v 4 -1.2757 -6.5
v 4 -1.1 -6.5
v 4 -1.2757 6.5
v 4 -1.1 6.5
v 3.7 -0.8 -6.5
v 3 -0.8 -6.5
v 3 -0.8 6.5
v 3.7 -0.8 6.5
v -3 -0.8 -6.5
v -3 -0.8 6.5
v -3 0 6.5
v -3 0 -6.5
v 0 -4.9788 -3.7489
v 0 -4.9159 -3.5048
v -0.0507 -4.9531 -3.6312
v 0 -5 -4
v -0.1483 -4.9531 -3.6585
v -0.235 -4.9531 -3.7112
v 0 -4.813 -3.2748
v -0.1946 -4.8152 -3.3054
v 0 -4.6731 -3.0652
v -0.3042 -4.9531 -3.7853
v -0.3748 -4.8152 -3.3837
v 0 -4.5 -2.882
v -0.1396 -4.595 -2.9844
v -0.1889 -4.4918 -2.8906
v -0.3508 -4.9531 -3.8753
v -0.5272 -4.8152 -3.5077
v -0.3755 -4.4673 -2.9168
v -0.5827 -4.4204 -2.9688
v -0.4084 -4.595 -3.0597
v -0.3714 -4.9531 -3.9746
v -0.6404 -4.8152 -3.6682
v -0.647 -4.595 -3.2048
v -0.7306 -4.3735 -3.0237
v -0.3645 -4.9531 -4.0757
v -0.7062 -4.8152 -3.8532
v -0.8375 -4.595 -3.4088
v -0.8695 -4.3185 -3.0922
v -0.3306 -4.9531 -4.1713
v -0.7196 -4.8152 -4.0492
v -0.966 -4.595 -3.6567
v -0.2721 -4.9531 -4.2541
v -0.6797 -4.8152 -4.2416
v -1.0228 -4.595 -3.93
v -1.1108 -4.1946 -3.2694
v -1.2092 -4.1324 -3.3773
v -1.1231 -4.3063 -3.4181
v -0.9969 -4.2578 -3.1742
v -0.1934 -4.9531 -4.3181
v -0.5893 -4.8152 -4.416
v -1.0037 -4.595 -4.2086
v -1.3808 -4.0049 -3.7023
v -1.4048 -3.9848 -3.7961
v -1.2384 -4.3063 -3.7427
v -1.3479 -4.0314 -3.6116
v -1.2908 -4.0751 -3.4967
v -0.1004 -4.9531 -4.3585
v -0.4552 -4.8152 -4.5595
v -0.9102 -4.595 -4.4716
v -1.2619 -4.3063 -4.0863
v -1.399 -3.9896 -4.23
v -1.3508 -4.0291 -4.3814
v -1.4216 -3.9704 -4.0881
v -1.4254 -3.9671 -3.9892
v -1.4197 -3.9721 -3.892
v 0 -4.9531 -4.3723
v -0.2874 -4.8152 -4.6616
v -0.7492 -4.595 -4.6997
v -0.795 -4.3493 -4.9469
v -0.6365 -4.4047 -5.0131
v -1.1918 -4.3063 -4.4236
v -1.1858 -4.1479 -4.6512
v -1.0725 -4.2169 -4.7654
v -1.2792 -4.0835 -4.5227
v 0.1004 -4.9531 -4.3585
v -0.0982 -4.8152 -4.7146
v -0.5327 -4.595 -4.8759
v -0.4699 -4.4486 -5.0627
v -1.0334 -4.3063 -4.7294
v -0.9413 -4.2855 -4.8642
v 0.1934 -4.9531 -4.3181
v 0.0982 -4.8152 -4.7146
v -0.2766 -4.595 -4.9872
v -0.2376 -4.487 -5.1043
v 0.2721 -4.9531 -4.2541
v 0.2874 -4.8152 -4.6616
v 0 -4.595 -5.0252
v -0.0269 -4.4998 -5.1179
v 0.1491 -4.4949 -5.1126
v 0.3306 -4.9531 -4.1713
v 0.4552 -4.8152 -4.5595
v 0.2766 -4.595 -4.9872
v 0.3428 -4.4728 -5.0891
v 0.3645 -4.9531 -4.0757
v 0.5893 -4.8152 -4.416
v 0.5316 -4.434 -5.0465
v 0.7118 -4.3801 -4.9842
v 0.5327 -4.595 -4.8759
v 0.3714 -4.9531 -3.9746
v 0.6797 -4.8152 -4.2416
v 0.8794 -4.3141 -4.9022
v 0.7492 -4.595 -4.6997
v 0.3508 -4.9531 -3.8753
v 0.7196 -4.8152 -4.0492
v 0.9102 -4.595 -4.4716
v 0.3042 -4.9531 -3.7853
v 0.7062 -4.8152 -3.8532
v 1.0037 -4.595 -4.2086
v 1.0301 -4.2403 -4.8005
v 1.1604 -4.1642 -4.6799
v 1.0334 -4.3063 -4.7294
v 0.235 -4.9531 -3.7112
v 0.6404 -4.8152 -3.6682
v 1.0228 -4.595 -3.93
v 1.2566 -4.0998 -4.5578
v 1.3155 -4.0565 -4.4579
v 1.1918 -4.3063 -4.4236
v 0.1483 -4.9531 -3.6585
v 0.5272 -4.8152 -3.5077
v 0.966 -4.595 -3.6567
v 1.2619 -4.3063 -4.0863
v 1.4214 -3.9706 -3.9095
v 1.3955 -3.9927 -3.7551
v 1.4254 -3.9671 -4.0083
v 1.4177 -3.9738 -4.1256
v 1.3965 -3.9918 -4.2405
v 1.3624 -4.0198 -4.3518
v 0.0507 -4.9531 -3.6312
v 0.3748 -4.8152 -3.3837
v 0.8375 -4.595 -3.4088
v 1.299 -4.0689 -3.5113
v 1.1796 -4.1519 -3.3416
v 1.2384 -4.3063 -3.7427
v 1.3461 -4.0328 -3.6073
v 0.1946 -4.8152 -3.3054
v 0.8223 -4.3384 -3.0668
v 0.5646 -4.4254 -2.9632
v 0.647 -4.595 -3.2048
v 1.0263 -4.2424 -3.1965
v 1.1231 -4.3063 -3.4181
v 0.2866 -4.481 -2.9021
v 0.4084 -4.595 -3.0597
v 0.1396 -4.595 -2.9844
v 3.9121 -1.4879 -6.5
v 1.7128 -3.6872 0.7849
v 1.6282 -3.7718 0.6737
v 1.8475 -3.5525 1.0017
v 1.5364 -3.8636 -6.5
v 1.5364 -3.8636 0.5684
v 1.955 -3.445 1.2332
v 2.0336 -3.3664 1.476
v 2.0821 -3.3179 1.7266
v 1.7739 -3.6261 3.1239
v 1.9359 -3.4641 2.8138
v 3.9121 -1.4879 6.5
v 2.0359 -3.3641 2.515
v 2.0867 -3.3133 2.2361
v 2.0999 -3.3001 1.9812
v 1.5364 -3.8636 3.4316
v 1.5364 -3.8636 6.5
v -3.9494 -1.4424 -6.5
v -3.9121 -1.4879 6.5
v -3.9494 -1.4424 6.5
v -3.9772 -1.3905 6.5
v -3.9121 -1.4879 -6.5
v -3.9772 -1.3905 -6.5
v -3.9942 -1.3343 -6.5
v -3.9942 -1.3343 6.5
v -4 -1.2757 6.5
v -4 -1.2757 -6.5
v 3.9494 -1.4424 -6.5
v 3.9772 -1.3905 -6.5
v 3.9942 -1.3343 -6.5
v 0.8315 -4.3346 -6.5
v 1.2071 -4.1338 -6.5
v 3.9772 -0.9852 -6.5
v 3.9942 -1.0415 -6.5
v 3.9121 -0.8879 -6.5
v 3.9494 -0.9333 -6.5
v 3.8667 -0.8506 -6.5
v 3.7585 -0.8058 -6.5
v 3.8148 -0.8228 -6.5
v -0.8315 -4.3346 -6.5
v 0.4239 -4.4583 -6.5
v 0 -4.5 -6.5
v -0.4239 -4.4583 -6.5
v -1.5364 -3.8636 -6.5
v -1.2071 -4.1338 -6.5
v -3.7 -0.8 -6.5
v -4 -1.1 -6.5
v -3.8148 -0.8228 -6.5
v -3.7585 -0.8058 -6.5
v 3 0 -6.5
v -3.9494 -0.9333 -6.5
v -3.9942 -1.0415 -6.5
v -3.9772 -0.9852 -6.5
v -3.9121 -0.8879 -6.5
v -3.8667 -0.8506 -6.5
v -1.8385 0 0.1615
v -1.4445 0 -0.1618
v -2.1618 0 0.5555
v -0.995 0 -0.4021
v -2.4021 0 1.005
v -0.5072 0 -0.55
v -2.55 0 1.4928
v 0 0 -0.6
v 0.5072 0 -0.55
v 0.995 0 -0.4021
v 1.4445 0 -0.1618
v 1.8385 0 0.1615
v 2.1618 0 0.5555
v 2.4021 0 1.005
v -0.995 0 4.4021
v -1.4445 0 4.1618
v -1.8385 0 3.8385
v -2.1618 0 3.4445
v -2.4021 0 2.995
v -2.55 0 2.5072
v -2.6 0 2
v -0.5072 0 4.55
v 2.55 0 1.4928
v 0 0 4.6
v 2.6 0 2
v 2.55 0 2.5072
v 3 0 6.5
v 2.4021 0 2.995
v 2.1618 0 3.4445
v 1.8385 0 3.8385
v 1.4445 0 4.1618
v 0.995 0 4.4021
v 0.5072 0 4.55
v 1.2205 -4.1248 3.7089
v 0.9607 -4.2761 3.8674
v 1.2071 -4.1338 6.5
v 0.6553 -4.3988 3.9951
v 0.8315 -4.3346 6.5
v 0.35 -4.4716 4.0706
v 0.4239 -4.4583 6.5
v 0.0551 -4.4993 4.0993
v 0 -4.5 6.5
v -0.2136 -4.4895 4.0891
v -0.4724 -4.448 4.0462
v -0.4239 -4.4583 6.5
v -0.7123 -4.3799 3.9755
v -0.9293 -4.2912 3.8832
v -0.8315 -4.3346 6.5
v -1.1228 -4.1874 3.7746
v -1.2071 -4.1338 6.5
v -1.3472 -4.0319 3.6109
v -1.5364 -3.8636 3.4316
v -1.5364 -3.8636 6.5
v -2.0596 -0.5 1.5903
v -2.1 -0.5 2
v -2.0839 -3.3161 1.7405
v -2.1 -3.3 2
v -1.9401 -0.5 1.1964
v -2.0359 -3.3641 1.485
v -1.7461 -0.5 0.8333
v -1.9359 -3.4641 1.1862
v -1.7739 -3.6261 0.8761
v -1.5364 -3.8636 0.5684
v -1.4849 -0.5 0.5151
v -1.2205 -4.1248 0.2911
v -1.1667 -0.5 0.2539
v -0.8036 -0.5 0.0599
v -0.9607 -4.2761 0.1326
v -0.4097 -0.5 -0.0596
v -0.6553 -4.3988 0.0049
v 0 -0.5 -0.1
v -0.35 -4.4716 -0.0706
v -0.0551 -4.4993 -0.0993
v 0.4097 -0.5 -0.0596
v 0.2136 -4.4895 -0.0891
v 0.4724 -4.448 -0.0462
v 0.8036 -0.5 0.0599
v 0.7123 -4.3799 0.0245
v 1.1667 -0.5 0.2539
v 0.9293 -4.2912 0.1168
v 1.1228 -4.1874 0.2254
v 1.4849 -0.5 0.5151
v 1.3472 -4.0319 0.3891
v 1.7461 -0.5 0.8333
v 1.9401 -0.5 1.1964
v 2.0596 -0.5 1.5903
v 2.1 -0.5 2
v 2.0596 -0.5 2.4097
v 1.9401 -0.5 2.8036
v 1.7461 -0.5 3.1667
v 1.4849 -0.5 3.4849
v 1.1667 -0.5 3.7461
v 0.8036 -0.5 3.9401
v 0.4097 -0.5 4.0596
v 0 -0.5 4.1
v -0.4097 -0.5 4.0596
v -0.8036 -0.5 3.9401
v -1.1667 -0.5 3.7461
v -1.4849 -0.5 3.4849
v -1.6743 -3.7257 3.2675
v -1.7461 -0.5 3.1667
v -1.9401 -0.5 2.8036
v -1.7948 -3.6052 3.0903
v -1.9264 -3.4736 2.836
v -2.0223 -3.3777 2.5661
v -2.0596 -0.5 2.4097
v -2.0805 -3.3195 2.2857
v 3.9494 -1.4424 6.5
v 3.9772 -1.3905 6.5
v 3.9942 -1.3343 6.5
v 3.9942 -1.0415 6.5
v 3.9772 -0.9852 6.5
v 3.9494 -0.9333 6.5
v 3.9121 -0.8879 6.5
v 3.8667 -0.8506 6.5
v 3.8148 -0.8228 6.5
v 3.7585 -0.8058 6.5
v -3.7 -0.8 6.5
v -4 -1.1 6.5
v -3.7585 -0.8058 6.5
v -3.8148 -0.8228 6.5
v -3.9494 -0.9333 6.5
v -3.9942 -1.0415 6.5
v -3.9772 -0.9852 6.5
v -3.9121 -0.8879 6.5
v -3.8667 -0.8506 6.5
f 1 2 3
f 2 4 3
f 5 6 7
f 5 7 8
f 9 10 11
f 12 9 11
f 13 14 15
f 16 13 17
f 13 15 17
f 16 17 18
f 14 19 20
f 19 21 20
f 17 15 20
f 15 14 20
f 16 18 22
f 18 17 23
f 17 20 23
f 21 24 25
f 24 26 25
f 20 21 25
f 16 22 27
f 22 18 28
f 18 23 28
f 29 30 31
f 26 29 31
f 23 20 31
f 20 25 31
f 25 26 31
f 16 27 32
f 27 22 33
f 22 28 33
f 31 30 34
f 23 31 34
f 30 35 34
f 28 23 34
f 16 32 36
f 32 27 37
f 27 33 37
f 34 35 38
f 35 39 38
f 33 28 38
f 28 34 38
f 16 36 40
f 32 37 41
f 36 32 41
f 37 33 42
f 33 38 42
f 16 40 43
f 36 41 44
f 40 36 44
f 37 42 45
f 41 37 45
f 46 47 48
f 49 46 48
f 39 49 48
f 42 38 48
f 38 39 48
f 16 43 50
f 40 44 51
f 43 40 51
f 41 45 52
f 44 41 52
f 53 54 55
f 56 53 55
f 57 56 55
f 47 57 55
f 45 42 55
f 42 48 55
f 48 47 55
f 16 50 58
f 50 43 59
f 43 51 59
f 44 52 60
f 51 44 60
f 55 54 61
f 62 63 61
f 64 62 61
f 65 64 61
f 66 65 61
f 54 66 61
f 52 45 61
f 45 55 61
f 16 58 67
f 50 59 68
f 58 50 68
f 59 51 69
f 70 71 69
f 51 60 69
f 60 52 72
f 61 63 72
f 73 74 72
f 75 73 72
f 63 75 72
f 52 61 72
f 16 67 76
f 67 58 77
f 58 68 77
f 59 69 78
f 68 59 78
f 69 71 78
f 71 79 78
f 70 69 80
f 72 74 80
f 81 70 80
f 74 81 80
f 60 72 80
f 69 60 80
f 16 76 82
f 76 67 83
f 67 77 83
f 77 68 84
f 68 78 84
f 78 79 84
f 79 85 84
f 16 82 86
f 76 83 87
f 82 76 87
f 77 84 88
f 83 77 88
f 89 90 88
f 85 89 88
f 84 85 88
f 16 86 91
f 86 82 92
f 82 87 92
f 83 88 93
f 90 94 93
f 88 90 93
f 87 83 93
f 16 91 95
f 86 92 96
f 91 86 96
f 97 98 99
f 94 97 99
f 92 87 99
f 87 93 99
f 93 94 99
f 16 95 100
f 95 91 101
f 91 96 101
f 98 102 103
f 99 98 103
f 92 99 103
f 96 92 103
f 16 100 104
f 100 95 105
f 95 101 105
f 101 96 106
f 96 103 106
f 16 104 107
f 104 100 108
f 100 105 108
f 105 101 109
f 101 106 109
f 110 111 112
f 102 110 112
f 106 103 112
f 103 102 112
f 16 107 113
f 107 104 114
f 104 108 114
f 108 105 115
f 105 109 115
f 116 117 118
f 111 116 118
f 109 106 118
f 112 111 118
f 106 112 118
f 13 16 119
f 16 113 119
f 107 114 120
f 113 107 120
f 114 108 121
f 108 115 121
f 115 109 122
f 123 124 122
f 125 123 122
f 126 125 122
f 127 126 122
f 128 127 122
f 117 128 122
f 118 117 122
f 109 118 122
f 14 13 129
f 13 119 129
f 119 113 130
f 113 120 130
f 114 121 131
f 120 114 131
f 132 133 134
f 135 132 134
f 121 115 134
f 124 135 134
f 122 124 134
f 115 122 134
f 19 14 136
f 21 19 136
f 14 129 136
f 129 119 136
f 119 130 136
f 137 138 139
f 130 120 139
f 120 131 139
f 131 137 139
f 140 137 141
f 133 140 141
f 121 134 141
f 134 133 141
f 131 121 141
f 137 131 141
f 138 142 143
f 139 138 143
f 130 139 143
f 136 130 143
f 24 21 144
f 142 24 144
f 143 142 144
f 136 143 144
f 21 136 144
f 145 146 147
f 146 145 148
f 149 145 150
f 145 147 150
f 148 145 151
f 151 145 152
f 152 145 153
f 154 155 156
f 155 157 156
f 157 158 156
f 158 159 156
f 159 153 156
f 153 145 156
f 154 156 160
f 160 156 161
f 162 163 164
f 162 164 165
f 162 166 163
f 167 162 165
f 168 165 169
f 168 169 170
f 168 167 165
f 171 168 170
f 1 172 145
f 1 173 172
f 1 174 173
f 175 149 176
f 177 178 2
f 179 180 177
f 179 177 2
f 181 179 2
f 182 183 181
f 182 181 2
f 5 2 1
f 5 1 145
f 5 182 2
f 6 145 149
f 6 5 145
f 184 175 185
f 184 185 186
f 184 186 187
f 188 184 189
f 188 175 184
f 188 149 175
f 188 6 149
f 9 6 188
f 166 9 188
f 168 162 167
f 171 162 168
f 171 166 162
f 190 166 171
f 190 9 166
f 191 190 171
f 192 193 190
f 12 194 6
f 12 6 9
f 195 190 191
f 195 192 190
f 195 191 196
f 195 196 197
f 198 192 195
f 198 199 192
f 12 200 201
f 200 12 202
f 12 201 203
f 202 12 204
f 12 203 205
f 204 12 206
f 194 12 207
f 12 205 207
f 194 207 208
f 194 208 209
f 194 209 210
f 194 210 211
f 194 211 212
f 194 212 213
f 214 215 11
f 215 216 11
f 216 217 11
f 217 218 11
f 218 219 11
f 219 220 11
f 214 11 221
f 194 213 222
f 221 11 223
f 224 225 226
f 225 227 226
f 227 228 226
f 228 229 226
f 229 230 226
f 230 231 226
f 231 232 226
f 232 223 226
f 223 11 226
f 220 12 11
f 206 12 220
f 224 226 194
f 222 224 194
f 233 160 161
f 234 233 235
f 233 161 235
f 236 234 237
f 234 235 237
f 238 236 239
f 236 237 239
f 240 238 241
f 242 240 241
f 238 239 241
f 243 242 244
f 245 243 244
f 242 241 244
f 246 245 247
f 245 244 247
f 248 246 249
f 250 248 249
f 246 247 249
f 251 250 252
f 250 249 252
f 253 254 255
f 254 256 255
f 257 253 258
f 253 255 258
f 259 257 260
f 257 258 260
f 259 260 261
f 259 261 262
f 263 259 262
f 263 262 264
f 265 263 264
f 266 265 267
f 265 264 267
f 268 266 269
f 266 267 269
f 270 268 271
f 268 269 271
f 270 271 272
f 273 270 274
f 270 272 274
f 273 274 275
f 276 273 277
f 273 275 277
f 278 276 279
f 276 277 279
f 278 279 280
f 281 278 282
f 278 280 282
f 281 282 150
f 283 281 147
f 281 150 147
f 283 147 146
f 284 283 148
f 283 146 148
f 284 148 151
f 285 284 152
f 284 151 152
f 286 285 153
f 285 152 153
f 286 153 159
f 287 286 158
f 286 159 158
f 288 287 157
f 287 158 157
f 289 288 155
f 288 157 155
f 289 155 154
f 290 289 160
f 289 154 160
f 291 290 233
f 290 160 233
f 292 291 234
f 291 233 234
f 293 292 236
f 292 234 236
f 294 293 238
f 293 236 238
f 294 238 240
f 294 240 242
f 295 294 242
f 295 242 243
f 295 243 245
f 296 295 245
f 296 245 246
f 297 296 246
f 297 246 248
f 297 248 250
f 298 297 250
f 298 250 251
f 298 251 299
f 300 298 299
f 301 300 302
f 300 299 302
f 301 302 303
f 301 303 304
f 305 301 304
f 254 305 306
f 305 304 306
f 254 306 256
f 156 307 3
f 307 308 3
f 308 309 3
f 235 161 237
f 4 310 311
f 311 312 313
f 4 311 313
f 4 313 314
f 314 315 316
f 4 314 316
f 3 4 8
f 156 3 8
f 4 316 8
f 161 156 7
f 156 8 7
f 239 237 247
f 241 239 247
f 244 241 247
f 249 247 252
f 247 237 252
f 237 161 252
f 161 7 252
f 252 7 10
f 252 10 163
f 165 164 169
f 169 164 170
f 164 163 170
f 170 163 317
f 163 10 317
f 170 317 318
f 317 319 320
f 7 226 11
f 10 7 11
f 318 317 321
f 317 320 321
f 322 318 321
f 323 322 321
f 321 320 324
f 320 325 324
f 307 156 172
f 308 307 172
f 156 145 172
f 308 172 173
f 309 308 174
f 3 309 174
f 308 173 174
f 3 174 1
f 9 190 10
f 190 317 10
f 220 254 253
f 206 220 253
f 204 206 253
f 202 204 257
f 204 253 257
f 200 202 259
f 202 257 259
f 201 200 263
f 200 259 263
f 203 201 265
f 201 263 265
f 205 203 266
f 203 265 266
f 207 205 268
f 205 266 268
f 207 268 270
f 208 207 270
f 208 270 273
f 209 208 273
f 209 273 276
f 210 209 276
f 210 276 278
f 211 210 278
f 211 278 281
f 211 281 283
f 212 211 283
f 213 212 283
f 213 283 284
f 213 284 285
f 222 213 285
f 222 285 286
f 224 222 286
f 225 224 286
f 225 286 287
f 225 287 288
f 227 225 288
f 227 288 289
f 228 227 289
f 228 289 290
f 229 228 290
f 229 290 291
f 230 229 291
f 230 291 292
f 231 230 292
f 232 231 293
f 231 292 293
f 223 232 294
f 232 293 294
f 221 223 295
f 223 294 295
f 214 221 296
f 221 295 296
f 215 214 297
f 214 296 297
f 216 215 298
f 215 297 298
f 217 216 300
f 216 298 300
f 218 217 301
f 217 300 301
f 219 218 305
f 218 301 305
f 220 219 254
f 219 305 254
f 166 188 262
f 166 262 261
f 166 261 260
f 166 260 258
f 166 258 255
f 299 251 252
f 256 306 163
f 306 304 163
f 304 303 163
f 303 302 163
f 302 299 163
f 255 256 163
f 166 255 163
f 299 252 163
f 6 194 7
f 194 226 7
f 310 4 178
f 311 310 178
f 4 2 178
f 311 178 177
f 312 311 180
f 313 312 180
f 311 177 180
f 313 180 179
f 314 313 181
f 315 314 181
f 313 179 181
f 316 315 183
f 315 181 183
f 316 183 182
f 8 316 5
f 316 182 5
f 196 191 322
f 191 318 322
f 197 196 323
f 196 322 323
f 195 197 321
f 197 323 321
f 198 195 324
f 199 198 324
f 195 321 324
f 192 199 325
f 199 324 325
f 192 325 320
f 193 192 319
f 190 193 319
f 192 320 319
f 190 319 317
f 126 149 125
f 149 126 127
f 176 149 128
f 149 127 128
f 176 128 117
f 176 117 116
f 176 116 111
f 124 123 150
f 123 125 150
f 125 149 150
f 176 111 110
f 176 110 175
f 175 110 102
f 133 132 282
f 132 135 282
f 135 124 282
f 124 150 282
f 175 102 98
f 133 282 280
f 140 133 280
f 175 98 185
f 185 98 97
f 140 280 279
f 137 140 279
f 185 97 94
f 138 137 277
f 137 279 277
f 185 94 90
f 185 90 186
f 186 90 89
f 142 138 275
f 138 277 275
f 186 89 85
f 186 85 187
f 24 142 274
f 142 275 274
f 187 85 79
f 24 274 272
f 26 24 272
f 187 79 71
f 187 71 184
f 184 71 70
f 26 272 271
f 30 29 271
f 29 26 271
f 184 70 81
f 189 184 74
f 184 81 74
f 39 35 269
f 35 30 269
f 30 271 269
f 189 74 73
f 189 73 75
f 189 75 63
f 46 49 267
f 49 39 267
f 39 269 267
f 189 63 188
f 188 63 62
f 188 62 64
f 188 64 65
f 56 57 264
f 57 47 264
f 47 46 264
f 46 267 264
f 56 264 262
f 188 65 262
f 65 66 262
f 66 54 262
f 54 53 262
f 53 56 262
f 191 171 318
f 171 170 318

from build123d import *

# Parameters (mm, degrees)
EXTRUDE_1_DEPTH             = 6.5
HOLE_WIZARD_M51_D           = 4.2
HOLE_WIZARD_M51_CSINK_D     = 5.2
HOLE_WIZARD_M51_CSINK_ANGLE = 90
FILLET_1_R                  = 0.3


with BuildPart() as part:
    # Эскиз1 → Бобышка-Вытянуть1 (new body, symmetric)
    with BuildSketch(Plane.XY):
        with BuildLine():
            Line((-3, 0), (3, 0))
            Line((3, 0), (3, -0.8))
            Line((3, -0.8), (4, -0.8))
            Line((4, -0.8), (4, -1.4))
            Line((4, -1.4), (1.536396103, -3.863603897))
            ThreePointArc((1.536396103, -3.863603897), (0, -4.5), (-1.536396103, -3.863603897))
            Line((-1.536396103, -3.863603897), (-4, -1.4))
            Line((-4, -1.4), (-4, -0.8))
            Line((-4, -0.8), (-3, -0.8))
            Line((-3, -0.8), (-3, 0))
        make_face()
    extrude(amount=EXTRUDE_1_DEPTH, both=True)

    # Отверстие обработанное метчиком M51 (through all)
    with Locations(Plane(origin=(0, 0, 0), x_dir=(1, 0, 0), z_dir=(0, 1, 0))):
        with Locations((0, -2)):
            CounterSinkHole(HOLE_WIZARD_M51_D / 2, HOLE_WIZARD_M51_CSINK_D / 2, counter_sink_angle=HOLE_WIZARD_M51_CSINK_ANGLE)

    # Эскиз5 → Повернуть1 (revolve)
    with BuildSketch(Plane(origin=(0, 0, 0), x_dir=(0, 0, -1), z_dir=(1, 0, 0))):
        with BuildLine():
            Line((4, -2), (4, -5))
            ThreePointArc((4, -5), (2.5, -3.5), (4, -2))
        make_face()
    revolve(axis=Axis((0, -2, -4), (0, -1, 0)))

    # Скругление1
    fillet_1_edges = [part.edges().sort_by_distance(p)[0] for p in [
        (4, -0.8, 0),
        (4, -1.4, 0),
        (-4, -1.4, 0),
        (-4, -0.8, 0),
    ]]
    fillet(fillet_1_edges, radius=FILLET_1_R)


solid = part.part
